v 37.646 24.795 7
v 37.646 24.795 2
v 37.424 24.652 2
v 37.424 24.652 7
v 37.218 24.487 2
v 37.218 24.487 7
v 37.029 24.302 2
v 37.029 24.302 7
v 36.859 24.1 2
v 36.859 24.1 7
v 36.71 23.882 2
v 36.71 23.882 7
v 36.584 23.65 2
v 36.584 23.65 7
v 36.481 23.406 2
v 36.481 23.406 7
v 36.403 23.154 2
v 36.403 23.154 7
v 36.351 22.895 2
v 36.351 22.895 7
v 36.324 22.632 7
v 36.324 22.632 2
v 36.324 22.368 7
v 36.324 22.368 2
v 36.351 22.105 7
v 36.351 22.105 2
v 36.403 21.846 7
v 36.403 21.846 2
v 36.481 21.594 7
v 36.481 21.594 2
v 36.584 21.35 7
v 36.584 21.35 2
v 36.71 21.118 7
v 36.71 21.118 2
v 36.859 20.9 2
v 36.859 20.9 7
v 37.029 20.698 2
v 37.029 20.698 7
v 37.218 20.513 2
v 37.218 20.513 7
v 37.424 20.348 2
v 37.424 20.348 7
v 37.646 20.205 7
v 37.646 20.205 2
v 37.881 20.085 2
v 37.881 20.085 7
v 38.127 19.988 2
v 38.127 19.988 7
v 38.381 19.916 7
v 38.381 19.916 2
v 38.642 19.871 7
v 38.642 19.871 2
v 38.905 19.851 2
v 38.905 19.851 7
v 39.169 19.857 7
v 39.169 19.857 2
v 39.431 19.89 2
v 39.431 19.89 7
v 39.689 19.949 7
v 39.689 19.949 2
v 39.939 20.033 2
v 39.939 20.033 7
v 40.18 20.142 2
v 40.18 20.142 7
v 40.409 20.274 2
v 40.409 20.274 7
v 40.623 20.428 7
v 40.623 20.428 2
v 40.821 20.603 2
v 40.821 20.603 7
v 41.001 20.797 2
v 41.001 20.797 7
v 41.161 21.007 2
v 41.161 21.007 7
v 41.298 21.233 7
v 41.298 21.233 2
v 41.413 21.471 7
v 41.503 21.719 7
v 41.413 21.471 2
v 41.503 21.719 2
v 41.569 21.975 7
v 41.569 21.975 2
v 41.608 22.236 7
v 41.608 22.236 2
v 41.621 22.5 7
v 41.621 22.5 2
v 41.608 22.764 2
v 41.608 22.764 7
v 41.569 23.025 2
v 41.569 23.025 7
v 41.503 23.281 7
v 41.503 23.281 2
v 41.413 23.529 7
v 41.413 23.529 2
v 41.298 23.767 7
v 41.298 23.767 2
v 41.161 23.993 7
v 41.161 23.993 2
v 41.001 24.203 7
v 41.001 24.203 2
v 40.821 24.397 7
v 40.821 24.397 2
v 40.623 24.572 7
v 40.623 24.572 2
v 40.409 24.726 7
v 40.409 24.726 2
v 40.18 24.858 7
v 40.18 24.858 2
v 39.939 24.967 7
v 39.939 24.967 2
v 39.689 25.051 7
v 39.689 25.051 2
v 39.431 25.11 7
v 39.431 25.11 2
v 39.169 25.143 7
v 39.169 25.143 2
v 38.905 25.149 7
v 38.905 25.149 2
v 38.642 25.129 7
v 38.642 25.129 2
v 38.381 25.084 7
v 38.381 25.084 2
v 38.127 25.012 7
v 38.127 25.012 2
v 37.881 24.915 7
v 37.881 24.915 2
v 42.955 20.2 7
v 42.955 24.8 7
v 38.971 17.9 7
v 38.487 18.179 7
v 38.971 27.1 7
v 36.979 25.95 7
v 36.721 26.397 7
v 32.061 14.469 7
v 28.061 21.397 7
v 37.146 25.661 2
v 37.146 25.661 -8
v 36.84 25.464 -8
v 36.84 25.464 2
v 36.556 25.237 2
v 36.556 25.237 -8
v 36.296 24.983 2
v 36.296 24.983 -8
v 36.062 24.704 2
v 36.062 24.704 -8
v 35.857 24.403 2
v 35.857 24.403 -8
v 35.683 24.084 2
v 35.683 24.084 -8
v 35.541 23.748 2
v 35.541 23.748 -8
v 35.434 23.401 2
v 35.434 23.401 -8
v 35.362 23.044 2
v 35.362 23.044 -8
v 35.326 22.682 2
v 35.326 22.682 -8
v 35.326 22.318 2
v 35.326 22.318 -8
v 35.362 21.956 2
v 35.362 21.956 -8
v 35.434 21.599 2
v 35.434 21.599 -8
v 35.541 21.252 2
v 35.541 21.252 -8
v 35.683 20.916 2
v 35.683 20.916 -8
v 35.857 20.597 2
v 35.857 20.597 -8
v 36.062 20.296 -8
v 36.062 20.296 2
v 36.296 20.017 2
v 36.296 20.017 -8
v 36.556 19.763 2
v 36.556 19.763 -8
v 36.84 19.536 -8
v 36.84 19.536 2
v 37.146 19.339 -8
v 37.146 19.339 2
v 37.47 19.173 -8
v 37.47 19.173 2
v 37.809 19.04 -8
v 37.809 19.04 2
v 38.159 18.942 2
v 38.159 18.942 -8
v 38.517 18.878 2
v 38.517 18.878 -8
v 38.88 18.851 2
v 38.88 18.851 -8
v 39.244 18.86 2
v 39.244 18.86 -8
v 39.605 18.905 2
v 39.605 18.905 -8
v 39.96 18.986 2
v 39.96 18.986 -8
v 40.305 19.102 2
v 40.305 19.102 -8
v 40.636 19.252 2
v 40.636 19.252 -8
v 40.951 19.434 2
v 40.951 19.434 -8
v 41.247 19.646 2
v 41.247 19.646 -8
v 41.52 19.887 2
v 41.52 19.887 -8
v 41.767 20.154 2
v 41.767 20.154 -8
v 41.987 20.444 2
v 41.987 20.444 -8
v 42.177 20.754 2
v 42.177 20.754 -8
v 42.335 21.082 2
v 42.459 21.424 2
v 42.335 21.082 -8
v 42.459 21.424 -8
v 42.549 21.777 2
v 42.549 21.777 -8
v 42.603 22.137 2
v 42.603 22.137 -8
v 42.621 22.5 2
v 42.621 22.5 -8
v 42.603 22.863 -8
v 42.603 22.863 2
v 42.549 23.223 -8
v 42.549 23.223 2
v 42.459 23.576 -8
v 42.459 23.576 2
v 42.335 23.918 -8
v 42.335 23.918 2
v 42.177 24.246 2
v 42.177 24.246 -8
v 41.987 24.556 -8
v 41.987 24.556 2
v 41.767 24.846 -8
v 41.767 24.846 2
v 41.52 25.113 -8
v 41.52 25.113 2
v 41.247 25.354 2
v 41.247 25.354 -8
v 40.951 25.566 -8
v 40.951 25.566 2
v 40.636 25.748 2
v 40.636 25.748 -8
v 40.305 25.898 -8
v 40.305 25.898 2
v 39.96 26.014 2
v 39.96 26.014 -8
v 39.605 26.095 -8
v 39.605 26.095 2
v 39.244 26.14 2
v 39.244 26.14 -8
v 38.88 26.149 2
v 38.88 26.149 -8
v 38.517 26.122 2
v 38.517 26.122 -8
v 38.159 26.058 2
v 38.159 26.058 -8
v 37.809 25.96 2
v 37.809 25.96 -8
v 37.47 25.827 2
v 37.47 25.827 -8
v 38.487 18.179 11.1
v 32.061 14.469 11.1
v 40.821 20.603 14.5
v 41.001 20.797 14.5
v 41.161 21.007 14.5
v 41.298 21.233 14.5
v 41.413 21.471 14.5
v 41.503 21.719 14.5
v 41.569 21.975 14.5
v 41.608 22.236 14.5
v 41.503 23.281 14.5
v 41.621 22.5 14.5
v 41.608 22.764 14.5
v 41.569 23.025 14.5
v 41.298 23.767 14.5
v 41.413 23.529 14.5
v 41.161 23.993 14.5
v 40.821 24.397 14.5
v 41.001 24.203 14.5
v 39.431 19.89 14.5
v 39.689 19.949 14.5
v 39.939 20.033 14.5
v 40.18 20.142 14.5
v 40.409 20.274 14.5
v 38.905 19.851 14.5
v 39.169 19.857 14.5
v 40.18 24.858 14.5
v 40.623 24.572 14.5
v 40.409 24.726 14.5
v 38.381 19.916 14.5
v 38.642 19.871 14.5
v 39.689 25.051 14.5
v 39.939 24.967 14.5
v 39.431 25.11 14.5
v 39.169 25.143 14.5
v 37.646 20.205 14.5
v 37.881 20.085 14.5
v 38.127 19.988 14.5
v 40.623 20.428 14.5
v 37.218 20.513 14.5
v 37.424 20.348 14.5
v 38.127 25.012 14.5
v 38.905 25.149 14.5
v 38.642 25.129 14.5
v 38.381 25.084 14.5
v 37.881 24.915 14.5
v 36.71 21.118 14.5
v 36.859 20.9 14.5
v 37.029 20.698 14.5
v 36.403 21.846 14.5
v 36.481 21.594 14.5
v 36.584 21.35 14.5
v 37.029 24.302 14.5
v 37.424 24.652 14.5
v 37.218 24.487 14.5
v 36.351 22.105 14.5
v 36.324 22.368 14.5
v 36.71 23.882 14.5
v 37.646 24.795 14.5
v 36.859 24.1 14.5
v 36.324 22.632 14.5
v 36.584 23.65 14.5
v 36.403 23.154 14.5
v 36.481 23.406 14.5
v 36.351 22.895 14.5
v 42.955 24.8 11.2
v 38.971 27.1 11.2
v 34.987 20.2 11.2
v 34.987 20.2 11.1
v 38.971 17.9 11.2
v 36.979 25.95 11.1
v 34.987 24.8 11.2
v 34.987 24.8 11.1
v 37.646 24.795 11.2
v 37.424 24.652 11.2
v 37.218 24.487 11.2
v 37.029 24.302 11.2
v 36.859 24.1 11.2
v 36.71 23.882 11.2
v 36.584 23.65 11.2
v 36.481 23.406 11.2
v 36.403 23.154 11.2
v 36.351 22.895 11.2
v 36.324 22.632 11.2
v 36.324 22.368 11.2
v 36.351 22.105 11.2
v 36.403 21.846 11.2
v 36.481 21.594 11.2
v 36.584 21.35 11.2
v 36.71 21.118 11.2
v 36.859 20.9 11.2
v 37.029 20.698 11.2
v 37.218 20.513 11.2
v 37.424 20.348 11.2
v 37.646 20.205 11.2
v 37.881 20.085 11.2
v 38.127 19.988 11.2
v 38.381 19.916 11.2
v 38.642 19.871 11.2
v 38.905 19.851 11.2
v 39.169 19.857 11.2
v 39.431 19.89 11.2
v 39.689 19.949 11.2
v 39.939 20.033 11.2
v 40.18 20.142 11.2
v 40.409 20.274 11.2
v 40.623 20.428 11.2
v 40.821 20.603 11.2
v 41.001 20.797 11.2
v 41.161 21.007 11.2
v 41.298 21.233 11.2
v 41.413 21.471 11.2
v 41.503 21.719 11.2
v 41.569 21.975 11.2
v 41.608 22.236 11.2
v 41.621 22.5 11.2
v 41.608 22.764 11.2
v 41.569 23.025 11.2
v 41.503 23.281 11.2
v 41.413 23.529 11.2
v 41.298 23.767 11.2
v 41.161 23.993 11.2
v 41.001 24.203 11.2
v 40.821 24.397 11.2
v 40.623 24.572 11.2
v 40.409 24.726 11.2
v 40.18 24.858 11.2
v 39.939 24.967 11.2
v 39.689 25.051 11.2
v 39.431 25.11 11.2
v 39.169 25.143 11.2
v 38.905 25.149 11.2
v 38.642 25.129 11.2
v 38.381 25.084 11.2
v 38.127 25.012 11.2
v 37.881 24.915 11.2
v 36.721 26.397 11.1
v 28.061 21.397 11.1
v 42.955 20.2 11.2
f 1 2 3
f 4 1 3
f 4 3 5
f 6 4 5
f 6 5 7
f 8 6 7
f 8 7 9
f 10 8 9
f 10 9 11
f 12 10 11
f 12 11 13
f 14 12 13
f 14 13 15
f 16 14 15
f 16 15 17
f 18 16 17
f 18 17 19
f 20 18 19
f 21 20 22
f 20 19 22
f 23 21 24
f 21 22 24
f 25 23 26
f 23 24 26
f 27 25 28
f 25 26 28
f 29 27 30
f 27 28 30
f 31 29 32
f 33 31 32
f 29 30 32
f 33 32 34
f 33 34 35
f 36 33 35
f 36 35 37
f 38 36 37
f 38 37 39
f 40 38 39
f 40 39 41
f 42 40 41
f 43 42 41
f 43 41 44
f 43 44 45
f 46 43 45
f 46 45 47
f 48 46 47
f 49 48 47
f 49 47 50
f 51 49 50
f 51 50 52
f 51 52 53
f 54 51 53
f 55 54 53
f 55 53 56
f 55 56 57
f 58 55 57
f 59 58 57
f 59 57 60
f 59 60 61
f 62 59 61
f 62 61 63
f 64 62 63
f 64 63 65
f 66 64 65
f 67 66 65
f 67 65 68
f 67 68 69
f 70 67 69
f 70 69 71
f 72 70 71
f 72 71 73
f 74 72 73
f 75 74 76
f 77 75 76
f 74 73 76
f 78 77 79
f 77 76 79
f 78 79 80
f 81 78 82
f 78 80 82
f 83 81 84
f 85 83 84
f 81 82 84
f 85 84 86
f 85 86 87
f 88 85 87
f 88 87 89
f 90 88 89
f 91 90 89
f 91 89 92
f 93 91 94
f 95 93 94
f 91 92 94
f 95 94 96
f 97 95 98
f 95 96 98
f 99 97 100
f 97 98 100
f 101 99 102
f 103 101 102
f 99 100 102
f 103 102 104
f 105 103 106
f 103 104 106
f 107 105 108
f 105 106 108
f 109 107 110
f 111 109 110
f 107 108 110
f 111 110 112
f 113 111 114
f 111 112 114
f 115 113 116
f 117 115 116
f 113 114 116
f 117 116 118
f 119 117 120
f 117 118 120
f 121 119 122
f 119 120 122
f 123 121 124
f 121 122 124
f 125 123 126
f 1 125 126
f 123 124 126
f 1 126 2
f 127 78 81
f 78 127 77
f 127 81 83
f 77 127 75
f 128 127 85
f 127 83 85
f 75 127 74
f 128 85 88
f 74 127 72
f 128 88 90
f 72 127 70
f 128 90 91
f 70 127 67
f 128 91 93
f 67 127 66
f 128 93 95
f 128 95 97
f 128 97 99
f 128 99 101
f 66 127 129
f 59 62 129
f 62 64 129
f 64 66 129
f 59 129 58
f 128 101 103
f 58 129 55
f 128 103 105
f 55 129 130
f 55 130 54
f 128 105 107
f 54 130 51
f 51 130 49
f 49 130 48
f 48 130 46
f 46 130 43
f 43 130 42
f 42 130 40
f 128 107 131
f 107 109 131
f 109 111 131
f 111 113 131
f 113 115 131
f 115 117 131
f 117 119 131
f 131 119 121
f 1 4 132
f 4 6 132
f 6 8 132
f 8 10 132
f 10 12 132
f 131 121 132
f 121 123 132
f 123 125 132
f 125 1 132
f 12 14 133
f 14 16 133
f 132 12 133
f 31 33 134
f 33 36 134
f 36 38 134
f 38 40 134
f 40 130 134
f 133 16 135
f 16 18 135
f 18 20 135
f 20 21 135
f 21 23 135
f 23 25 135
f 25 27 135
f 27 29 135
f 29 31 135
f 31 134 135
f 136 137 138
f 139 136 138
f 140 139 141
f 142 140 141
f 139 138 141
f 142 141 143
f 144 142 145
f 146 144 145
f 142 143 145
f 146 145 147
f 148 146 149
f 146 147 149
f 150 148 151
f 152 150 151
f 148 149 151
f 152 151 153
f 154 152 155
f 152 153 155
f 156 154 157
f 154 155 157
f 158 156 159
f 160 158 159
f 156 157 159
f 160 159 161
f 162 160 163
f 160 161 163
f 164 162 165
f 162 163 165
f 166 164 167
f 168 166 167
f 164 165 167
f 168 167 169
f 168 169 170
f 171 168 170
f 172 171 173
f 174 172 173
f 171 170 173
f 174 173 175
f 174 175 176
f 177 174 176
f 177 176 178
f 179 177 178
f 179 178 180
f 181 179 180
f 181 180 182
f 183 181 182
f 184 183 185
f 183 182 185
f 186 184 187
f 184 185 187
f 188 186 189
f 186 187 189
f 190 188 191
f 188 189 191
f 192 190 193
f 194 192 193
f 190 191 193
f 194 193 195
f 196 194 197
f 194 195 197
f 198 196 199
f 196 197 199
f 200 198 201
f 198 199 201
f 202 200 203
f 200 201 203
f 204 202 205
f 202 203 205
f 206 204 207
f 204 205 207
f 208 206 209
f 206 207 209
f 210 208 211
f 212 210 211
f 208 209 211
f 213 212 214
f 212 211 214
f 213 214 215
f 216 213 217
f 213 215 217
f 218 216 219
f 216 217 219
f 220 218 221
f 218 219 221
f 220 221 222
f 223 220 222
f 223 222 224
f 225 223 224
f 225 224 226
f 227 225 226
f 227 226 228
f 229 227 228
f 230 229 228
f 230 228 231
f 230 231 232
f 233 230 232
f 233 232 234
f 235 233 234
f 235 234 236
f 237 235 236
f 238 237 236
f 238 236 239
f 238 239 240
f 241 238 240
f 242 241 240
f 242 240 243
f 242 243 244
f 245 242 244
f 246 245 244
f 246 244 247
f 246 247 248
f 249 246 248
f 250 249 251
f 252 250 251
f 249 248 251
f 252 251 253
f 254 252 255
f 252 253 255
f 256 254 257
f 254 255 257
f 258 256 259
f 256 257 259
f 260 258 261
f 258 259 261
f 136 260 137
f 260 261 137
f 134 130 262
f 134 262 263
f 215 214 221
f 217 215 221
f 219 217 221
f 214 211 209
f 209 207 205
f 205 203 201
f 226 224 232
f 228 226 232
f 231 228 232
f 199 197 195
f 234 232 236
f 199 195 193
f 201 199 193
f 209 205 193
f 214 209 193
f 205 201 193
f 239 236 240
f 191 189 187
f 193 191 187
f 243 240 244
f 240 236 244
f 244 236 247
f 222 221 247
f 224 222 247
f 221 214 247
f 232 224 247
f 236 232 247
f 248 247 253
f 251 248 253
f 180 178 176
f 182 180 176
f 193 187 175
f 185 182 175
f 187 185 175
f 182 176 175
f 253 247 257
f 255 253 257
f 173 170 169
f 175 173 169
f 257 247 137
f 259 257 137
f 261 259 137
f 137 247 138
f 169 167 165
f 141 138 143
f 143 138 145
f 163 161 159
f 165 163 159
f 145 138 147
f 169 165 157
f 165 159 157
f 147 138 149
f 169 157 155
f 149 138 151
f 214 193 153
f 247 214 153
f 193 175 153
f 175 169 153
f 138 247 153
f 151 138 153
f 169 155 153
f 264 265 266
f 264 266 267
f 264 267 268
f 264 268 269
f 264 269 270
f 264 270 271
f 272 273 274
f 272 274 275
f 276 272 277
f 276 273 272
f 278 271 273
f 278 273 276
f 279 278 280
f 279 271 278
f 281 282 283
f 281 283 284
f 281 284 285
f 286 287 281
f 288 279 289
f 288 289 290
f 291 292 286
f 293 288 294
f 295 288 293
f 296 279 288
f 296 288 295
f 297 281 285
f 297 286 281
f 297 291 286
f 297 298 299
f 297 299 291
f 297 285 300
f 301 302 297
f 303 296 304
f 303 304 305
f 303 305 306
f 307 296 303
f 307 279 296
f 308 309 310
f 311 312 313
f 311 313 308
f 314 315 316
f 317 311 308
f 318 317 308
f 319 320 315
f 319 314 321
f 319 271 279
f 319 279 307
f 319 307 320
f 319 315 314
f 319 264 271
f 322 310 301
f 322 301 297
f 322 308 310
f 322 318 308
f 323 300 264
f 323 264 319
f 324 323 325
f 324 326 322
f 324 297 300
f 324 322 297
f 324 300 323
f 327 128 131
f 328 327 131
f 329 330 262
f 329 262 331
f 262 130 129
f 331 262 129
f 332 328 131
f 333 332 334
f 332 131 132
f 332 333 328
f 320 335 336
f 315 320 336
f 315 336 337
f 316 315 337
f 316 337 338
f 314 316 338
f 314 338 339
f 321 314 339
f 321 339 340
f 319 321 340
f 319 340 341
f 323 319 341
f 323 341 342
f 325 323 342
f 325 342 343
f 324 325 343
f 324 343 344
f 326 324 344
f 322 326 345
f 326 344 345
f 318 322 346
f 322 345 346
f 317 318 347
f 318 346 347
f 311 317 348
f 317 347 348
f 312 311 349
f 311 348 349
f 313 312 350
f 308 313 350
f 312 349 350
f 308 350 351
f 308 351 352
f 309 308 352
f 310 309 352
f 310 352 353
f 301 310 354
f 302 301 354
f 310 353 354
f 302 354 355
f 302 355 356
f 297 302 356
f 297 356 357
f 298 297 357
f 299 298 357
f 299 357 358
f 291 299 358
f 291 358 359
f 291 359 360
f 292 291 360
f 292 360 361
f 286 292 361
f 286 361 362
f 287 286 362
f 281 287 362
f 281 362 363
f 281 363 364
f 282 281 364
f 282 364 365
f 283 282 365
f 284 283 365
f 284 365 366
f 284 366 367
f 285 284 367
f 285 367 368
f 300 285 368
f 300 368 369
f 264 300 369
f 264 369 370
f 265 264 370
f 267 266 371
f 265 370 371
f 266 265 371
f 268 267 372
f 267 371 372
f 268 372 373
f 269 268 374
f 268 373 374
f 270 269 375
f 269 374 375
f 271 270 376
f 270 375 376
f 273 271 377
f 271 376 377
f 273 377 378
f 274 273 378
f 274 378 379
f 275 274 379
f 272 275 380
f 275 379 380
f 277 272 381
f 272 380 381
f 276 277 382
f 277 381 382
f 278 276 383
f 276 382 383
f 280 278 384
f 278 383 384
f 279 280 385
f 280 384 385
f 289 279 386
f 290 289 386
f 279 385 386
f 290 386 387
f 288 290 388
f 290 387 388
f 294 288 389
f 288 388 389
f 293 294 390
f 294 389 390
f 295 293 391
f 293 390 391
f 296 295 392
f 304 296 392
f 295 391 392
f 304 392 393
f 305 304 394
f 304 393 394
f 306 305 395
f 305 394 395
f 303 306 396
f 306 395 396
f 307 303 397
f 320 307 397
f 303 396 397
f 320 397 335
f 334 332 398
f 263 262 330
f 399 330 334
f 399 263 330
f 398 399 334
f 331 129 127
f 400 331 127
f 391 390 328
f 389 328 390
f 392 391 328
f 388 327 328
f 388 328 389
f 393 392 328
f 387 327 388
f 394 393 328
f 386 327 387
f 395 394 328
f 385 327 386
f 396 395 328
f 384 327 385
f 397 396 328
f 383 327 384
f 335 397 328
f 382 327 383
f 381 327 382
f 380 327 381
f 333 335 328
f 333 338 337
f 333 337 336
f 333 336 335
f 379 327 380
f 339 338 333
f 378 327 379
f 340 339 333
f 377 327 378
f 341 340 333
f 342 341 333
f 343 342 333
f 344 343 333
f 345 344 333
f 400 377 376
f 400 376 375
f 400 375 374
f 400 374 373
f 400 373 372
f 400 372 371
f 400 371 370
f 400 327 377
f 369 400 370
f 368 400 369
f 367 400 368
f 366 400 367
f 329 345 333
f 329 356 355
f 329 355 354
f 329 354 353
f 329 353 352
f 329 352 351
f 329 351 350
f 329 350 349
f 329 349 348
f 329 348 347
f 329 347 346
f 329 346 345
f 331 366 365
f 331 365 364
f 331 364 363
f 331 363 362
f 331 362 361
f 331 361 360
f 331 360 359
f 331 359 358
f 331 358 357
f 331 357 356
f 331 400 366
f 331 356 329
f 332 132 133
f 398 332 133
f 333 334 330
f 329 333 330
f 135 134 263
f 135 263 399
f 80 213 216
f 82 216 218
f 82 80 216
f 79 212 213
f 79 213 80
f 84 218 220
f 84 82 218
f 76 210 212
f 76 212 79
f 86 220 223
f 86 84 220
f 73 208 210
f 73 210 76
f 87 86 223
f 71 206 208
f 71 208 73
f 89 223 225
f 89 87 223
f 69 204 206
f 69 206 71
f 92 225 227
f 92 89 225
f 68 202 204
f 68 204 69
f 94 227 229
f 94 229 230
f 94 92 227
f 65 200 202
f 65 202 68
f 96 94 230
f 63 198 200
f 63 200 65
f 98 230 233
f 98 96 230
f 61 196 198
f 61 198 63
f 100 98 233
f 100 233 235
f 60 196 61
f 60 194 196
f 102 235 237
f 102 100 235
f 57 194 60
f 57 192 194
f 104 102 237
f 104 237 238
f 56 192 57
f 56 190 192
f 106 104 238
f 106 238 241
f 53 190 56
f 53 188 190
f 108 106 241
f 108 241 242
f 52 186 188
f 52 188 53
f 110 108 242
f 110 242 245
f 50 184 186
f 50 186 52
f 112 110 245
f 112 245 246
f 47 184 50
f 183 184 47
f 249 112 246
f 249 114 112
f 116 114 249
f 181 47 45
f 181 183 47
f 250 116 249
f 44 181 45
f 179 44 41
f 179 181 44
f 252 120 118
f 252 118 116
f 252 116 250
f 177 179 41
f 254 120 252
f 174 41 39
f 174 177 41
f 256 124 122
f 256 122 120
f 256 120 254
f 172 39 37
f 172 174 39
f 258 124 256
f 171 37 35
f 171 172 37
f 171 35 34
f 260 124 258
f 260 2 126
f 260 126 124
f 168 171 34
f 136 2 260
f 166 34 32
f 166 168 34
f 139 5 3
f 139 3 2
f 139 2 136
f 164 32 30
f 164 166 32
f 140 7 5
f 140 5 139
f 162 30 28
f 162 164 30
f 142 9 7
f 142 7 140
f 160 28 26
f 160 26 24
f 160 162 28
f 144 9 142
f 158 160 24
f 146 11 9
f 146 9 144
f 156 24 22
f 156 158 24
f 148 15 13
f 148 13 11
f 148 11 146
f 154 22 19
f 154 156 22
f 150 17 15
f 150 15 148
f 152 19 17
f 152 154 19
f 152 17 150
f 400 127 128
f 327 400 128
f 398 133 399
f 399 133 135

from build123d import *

# Parameters (mm, degrees)
BOX014_W                                          = 8
BOX014_H                                          = 10
BOX014_DEPTH                                      = 4.1
PRISM009_DEPTH                                    = 4.2
CYLINDER014005916_R                               = 3.65
CYLINDER014005916_DEPTH                           = 10
CYLINDER014005905_R                               = 2.65
CYLINDER014005905_DEPTH                           = 22.5
FUSION001089102007007003008034017_PLACEMENT_ANGLE = 120


with BuildPart() as krychle014:
    # Box014 → Box014 (new body)
    with BuildSketch(Plane(origin=(-3.5, 0, 7), x_dir=(1, 0, 0), z_dir=(0, 0, 1))):
        with Locations((4, 5)):
            Rectangle(BOX014_W, BOX014_H)
    extrude(amount=BOX014_DEPTH)


with BuildPart() as m4x005:
    # prism009 → prism009 (new body)
    with BuildSketch(Plane(origin=(0, 0, 7), x_dir=(0, 1, 0), z_dir=(0, 0, 1))):
        Polygon((4.6, 0), (2.3, 3.983717), (-2.3, 3.983717), (-4.6, 0), (-2.3, -3.983717), (2.3, -3.983717), align=None)
    extrude(amount=PRISM009_DEPTH)


with BuildPart() as v_lec826:
    # Cylinder014005916 → Cylinder014005916 (new body)
    with BuildSketch(Plane.XY.offset(-8)):
        Circle(CYLINDER014005916_R)
    extrude(amount=CYLINDER014005916_DEPTH)


with BuildPart() as m4nut014:
    # Cylinder014005905 → Cylinder014005905 (new body)
    with BuildSketch(Plane.XY.offset(-8)):
        Circle(CYLINDER014005905_R)
    extrude(amount=CYLINDER014005905_DEPTH)

    # Fusion001089102007007003008034015: union Krychle014, M4X005, Válec826
    add(krychle014.part)
    add(m4x005.part)
    add(v_lec826.part)


with BuildPart() as m4nut014_1:
    # Fusion001089102007007003008034015 placement: moved
    add(m4nut014.part.moved(Location((0, -45, 0))))


with BuildPart() as m4nut014_2:
    # Fusion001089102007007003008034017 placement: moved
    add(m4nut014_1.part.rotate(Axis((0, 0, 0), (0, 0, 1)), FUSION001089102007007003008034017_PLACEMENT_ANGLE))


solid = m4nut014_2.part
